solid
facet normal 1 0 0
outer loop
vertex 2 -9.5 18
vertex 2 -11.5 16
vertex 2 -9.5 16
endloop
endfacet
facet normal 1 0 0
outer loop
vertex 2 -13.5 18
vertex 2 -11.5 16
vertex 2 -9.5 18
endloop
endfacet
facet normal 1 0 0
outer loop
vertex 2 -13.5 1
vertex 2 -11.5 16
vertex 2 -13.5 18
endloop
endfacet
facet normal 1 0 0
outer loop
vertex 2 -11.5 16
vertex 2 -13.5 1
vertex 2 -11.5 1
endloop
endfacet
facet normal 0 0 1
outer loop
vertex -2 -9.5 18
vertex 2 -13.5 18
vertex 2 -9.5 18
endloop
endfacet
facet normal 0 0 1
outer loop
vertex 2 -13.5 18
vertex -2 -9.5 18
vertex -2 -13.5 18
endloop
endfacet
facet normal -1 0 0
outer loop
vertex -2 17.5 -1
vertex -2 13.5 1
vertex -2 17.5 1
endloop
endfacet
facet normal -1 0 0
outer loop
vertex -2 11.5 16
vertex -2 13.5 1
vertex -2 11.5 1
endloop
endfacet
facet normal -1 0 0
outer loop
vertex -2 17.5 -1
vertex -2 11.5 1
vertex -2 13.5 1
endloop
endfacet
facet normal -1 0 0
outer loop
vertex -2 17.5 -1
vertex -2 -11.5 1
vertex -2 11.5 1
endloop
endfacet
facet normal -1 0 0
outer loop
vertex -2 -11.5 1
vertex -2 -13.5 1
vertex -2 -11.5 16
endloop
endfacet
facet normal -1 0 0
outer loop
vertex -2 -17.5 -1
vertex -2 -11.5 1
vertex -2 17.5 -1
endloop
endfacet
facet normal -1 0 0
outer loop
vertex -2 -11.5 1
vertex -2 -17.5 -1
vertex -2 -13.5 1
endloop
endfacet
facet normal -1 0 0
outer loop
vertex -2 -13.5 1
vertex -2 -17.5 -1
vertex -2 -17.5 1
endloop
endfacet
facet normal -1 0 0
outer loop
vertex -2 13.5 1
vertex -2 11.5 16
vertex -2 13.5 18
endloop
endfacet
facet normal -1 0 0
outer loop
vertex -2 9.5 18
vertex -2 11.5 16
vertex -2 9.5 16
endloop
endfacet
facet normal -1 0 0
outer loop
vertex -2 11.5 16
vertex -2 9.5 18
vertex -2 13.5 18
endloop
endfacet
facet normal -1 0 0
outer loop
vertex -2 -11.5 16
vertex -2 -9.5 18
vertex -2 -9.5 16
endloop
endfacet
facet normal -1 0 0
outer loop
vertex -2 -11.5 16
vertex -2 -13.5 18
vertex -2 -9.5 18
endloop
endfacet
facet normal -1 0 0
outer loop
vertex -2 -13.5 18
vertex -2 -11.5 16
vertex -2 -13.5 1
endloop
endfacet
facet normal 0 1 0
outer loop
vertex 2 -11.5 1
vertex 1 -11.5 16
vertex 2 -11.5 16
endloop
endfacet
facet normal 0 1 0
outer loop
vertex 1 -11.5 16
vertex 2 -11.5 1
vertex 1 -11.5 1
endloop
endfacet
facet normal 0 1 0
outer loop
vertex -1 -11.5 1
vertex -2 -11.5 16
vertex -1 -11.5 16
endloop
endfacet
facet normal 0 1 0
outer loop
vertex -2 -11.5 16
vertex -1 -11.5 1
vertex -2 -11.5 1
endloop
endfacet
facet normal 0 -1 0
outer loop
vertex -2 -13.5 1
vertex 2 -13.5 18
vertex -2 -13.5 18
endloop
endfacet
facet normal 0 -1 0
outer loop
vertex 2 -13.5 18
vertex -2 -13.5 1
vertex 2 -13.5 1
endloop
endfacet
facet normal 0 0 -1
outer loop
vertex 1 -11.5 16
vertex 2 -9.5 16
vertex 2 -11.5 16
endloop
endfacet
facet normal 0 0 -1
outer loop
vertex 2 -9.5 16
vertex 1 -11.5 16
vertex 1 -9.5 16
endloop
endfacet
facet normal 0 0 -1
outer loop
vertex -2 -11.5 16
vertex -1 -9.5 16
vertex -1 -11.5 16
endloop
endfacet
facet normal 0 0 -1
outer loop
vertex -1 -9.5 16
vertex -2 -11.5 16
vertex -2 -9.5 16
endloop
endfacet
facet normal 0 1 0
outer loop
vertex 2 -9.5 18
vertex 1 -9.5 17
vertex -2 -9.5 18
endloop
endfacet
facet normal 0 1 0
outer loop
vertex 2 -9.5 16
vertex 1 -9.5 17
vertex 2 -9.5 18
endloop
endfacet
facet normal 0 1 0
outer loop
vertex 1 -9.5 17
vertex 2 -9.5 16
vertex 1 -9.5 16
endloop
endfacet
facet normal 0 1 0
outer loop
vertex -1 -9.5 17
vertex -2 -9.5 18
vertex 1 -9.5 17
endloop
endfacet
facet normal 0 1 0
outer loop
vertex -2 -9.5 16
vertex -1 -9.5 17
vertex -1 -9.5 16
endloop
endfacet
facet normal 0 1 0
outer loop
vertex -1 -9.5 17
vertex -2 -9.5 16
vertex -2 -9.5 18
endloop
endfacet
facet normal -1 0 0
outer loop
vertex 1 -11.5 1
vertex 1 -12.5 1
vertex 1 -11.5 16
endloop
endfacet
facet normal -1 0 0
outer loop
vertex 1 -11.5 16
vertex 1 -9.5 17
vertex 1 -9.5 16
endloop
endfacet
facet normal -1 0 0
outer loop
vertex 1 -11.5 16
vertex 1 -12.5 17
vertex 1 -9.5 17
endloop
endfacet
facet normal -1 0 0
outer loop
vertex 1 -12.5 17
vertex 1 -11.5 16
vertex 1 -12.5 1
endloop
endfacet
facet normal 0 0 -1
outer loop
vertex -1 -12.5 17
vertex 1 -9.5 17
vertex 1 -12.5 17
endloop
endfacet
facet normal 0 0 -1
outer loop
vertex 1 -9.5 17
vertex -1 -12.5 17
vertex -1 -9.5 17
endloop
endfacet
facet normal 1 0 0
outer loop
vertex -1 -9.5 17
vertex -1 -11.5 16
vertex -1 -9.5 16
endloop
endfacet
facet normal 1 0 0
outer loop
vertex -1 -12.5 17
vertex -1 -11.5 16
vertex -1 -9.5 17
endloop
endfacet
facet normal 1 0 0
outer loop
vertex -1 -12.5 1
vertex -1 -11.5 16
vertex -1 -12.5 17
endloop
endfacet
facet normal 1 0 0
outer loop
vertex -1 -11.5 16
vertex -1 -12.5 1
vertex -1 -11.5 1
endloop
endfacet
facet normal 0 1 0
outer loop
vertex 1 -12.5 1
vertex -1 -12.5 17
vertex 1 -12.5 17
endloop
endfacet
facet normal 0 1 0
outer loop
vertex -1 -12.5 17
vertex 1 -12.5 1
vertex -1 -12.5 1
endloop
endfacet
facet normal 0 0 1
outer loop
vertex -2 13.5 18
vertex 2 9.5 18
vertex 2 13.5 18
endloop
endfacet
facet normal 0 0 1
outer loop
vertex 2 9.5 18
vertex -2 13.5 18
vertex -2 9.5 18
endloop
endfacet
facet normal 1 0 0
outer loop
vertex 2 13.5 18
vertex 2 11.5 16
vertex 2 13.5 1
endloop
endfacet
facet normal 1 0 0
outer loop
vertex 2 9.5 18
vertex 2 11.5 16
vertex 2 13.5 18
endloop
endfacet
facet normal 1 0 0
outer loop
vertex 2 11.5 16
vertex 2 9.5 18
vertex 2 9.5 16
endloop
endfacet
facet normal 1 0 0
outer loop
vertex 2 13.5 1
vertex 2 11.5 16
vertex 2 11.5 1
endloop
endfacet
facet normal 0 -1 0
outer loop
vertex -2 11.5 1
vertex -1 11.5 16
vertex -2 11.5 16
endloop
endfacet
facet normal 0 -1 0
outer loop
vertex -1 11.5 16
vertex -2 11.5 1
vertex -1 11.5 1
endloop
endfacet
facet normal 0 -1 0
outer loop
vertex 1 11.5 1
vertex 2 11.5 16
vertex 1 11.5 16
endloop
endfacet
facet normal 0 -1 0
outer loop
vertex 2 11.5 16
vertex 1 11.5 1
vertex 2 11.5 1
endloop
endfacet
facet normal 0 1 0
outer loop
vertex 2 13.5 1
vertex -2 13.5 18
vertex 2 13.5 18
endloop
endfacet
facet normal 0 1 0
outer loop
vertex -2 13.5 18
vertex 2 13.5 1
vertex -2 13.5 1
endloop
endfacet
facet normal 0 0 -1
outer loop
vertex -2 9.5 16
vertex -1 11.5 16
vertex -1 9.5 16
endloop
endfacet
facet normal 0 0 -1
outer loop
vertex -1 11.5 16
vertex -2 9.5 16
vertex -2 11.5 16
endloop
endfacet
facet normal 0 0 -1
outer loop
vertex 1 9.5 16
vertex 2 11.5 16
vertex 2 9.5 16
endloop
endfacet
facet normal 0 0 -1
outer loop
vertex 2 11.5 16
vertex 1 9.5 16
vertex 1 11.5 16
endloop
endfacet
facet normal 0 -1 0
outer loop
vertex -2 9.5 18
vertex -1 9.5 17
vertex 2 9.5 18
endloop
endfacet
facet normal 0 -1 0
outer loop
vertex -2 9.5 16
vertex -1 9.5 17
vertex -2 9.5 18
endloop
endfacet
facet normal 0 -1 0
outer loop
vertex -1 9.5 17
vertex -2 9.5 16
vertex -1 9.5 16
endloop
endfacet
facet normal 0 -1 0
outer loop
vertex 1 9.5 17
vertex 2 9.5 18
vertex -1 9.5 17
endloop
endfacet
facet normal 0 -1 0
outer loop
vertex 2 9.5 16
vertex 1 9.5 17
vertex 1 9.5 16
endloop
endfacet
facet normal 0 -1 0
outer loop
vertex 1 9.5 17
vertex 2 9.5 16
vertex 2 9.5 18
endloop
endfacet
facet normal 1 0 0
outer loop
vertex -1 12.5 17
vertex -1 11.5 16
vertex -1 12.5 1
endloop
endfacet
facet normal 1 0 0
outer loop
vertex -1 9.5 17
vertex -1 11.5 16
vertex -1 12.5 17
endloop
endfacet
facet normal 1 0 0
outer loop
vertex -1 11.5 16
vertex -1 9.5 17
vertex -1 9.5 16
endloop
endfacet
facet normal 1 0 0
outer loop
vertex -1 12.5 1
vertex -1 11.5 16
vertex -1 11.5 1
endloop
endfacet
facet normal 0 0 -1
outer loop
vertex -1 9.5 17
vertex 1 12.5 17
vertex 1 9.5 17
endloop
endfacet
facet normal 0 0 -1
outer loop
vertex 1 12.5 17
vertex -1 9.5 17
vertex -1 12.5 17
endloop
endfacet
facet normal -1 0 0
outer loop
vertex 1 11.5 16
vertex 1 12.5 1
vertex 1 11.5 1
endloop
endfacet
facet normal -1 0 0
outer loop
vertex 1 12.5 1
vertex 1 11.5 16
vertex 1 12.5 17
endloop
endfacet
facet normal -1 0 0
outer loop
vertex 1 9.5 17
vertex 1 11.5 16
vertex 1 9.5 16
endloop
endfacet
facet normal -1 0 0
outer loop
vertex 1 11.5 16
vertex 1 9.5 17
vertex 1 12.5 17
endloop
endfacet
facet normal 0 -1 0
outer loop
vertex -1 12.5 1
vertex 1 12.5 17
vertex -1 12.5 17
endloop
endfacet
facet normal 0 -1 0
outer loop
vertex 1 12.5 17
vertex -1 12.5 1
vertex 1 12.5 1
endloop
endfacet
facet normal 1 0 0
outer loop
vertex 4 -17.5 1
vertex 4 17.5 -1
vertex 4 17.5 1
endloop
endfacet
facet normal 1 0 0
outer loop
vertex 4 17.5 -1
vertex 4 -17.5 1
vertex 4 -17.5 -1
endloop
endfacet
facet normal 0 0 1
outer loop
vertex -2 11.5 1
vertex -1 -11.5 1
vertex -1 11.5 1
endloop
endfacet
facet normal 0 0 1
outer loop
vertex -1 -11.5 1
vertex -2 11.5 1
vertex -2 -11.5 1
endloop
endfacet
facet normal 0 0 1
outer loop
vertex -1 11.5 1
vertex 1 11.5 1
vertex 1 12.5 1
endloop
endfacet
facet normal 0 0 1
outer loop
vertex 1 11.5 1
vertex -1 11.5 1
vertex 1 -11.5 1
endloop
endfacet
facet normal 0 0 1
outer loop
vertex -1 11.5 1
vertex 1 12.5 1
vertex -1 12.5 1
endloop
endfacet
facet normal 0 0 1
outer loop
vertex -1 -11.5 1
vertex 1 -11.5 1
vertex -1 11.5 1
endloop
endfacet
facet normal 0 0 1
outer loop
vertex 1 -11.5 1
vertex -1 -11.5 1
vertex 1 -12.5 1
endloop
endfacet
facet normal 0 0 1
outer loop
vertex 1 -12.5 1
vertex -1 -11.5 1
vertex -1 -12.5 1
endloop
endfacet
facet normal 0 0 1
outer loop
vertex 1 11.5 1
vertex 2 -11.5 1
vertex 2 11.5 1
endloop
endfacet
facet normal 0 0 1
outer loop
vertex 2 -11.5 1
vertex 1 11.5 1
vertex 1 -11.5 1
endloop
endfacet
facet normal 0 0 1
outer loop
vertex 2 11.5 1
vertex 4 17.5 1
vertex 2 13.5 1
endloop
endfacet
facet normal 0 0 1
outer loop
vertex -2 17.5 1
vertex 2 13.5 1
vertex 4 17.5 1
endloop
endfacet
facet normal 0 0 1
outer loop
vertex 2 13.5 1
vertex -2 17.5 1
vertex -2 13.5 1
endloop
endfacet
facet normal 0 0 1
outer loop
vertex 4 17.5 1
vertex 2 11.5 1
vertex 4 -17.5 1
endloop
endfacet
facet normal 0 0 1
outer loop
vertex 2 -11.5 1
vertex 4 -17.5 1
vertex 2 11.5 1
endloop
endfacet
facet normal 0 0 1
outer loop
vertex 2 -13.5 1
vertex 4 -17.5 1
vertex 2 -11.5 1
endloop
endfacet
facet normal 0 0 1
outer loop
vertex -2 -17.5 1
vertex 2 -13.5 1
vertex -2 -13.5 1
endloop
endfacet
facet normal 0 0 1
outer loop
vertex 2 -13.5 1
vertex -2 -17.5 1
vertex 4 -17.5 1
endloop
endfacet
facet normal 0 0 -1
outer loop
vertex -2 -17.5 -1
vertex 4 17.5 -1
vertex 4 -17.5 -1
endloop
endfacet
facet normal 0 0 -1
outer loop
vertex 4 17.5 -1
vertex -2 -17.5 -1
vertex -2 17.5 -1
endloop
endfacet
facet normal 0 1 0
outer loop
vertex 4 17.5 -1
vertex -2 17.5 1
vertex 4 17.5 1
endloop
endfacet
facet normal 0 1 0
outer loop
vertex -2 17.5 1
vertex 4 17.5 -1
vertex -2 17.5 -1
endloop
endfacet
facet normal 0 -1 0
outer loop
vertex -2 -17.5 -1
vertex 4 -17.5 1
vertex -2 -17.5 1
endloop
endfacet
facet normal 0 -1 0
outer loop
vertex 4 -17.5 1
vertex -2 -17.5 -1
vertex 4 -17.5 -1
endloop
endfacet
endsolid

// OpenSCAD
// Global
bracketThickness=2;

module mountingArm(height, width, thickness)
{
	difference()
	{
		union()
		{
			cube([thickness+2,bracketThickness,height+2], center=true);
			translate([0,bracketThickness,height/2]) cube([thickness+2,bracketThickness,2], center=true);
		}

		union()
		{
			translate([0,bracketThickness,-1]) cube([thickness,bracketThickness*2,height+2], center=true);
		}
	}
}

module mountingBracket(height, width, thickness)
{
	difference()
	{
		union()
		{
			translate([1,0,0]) cube([thickness+4,width+10,bracketThickness], center=true);
			translate([0,-width/2,bracketThickness/2 + height/2]) mountingArm(height, width, thickness);
			translate([0,+width/2,bracketThickness/2 + height/2]) rotate([0,0,180])mountingArm(height, width, thickness);
		}

		union()
		{
		}
	}
}

//mountingArm(50,37,5);
mountingBracket(16,25,2);
